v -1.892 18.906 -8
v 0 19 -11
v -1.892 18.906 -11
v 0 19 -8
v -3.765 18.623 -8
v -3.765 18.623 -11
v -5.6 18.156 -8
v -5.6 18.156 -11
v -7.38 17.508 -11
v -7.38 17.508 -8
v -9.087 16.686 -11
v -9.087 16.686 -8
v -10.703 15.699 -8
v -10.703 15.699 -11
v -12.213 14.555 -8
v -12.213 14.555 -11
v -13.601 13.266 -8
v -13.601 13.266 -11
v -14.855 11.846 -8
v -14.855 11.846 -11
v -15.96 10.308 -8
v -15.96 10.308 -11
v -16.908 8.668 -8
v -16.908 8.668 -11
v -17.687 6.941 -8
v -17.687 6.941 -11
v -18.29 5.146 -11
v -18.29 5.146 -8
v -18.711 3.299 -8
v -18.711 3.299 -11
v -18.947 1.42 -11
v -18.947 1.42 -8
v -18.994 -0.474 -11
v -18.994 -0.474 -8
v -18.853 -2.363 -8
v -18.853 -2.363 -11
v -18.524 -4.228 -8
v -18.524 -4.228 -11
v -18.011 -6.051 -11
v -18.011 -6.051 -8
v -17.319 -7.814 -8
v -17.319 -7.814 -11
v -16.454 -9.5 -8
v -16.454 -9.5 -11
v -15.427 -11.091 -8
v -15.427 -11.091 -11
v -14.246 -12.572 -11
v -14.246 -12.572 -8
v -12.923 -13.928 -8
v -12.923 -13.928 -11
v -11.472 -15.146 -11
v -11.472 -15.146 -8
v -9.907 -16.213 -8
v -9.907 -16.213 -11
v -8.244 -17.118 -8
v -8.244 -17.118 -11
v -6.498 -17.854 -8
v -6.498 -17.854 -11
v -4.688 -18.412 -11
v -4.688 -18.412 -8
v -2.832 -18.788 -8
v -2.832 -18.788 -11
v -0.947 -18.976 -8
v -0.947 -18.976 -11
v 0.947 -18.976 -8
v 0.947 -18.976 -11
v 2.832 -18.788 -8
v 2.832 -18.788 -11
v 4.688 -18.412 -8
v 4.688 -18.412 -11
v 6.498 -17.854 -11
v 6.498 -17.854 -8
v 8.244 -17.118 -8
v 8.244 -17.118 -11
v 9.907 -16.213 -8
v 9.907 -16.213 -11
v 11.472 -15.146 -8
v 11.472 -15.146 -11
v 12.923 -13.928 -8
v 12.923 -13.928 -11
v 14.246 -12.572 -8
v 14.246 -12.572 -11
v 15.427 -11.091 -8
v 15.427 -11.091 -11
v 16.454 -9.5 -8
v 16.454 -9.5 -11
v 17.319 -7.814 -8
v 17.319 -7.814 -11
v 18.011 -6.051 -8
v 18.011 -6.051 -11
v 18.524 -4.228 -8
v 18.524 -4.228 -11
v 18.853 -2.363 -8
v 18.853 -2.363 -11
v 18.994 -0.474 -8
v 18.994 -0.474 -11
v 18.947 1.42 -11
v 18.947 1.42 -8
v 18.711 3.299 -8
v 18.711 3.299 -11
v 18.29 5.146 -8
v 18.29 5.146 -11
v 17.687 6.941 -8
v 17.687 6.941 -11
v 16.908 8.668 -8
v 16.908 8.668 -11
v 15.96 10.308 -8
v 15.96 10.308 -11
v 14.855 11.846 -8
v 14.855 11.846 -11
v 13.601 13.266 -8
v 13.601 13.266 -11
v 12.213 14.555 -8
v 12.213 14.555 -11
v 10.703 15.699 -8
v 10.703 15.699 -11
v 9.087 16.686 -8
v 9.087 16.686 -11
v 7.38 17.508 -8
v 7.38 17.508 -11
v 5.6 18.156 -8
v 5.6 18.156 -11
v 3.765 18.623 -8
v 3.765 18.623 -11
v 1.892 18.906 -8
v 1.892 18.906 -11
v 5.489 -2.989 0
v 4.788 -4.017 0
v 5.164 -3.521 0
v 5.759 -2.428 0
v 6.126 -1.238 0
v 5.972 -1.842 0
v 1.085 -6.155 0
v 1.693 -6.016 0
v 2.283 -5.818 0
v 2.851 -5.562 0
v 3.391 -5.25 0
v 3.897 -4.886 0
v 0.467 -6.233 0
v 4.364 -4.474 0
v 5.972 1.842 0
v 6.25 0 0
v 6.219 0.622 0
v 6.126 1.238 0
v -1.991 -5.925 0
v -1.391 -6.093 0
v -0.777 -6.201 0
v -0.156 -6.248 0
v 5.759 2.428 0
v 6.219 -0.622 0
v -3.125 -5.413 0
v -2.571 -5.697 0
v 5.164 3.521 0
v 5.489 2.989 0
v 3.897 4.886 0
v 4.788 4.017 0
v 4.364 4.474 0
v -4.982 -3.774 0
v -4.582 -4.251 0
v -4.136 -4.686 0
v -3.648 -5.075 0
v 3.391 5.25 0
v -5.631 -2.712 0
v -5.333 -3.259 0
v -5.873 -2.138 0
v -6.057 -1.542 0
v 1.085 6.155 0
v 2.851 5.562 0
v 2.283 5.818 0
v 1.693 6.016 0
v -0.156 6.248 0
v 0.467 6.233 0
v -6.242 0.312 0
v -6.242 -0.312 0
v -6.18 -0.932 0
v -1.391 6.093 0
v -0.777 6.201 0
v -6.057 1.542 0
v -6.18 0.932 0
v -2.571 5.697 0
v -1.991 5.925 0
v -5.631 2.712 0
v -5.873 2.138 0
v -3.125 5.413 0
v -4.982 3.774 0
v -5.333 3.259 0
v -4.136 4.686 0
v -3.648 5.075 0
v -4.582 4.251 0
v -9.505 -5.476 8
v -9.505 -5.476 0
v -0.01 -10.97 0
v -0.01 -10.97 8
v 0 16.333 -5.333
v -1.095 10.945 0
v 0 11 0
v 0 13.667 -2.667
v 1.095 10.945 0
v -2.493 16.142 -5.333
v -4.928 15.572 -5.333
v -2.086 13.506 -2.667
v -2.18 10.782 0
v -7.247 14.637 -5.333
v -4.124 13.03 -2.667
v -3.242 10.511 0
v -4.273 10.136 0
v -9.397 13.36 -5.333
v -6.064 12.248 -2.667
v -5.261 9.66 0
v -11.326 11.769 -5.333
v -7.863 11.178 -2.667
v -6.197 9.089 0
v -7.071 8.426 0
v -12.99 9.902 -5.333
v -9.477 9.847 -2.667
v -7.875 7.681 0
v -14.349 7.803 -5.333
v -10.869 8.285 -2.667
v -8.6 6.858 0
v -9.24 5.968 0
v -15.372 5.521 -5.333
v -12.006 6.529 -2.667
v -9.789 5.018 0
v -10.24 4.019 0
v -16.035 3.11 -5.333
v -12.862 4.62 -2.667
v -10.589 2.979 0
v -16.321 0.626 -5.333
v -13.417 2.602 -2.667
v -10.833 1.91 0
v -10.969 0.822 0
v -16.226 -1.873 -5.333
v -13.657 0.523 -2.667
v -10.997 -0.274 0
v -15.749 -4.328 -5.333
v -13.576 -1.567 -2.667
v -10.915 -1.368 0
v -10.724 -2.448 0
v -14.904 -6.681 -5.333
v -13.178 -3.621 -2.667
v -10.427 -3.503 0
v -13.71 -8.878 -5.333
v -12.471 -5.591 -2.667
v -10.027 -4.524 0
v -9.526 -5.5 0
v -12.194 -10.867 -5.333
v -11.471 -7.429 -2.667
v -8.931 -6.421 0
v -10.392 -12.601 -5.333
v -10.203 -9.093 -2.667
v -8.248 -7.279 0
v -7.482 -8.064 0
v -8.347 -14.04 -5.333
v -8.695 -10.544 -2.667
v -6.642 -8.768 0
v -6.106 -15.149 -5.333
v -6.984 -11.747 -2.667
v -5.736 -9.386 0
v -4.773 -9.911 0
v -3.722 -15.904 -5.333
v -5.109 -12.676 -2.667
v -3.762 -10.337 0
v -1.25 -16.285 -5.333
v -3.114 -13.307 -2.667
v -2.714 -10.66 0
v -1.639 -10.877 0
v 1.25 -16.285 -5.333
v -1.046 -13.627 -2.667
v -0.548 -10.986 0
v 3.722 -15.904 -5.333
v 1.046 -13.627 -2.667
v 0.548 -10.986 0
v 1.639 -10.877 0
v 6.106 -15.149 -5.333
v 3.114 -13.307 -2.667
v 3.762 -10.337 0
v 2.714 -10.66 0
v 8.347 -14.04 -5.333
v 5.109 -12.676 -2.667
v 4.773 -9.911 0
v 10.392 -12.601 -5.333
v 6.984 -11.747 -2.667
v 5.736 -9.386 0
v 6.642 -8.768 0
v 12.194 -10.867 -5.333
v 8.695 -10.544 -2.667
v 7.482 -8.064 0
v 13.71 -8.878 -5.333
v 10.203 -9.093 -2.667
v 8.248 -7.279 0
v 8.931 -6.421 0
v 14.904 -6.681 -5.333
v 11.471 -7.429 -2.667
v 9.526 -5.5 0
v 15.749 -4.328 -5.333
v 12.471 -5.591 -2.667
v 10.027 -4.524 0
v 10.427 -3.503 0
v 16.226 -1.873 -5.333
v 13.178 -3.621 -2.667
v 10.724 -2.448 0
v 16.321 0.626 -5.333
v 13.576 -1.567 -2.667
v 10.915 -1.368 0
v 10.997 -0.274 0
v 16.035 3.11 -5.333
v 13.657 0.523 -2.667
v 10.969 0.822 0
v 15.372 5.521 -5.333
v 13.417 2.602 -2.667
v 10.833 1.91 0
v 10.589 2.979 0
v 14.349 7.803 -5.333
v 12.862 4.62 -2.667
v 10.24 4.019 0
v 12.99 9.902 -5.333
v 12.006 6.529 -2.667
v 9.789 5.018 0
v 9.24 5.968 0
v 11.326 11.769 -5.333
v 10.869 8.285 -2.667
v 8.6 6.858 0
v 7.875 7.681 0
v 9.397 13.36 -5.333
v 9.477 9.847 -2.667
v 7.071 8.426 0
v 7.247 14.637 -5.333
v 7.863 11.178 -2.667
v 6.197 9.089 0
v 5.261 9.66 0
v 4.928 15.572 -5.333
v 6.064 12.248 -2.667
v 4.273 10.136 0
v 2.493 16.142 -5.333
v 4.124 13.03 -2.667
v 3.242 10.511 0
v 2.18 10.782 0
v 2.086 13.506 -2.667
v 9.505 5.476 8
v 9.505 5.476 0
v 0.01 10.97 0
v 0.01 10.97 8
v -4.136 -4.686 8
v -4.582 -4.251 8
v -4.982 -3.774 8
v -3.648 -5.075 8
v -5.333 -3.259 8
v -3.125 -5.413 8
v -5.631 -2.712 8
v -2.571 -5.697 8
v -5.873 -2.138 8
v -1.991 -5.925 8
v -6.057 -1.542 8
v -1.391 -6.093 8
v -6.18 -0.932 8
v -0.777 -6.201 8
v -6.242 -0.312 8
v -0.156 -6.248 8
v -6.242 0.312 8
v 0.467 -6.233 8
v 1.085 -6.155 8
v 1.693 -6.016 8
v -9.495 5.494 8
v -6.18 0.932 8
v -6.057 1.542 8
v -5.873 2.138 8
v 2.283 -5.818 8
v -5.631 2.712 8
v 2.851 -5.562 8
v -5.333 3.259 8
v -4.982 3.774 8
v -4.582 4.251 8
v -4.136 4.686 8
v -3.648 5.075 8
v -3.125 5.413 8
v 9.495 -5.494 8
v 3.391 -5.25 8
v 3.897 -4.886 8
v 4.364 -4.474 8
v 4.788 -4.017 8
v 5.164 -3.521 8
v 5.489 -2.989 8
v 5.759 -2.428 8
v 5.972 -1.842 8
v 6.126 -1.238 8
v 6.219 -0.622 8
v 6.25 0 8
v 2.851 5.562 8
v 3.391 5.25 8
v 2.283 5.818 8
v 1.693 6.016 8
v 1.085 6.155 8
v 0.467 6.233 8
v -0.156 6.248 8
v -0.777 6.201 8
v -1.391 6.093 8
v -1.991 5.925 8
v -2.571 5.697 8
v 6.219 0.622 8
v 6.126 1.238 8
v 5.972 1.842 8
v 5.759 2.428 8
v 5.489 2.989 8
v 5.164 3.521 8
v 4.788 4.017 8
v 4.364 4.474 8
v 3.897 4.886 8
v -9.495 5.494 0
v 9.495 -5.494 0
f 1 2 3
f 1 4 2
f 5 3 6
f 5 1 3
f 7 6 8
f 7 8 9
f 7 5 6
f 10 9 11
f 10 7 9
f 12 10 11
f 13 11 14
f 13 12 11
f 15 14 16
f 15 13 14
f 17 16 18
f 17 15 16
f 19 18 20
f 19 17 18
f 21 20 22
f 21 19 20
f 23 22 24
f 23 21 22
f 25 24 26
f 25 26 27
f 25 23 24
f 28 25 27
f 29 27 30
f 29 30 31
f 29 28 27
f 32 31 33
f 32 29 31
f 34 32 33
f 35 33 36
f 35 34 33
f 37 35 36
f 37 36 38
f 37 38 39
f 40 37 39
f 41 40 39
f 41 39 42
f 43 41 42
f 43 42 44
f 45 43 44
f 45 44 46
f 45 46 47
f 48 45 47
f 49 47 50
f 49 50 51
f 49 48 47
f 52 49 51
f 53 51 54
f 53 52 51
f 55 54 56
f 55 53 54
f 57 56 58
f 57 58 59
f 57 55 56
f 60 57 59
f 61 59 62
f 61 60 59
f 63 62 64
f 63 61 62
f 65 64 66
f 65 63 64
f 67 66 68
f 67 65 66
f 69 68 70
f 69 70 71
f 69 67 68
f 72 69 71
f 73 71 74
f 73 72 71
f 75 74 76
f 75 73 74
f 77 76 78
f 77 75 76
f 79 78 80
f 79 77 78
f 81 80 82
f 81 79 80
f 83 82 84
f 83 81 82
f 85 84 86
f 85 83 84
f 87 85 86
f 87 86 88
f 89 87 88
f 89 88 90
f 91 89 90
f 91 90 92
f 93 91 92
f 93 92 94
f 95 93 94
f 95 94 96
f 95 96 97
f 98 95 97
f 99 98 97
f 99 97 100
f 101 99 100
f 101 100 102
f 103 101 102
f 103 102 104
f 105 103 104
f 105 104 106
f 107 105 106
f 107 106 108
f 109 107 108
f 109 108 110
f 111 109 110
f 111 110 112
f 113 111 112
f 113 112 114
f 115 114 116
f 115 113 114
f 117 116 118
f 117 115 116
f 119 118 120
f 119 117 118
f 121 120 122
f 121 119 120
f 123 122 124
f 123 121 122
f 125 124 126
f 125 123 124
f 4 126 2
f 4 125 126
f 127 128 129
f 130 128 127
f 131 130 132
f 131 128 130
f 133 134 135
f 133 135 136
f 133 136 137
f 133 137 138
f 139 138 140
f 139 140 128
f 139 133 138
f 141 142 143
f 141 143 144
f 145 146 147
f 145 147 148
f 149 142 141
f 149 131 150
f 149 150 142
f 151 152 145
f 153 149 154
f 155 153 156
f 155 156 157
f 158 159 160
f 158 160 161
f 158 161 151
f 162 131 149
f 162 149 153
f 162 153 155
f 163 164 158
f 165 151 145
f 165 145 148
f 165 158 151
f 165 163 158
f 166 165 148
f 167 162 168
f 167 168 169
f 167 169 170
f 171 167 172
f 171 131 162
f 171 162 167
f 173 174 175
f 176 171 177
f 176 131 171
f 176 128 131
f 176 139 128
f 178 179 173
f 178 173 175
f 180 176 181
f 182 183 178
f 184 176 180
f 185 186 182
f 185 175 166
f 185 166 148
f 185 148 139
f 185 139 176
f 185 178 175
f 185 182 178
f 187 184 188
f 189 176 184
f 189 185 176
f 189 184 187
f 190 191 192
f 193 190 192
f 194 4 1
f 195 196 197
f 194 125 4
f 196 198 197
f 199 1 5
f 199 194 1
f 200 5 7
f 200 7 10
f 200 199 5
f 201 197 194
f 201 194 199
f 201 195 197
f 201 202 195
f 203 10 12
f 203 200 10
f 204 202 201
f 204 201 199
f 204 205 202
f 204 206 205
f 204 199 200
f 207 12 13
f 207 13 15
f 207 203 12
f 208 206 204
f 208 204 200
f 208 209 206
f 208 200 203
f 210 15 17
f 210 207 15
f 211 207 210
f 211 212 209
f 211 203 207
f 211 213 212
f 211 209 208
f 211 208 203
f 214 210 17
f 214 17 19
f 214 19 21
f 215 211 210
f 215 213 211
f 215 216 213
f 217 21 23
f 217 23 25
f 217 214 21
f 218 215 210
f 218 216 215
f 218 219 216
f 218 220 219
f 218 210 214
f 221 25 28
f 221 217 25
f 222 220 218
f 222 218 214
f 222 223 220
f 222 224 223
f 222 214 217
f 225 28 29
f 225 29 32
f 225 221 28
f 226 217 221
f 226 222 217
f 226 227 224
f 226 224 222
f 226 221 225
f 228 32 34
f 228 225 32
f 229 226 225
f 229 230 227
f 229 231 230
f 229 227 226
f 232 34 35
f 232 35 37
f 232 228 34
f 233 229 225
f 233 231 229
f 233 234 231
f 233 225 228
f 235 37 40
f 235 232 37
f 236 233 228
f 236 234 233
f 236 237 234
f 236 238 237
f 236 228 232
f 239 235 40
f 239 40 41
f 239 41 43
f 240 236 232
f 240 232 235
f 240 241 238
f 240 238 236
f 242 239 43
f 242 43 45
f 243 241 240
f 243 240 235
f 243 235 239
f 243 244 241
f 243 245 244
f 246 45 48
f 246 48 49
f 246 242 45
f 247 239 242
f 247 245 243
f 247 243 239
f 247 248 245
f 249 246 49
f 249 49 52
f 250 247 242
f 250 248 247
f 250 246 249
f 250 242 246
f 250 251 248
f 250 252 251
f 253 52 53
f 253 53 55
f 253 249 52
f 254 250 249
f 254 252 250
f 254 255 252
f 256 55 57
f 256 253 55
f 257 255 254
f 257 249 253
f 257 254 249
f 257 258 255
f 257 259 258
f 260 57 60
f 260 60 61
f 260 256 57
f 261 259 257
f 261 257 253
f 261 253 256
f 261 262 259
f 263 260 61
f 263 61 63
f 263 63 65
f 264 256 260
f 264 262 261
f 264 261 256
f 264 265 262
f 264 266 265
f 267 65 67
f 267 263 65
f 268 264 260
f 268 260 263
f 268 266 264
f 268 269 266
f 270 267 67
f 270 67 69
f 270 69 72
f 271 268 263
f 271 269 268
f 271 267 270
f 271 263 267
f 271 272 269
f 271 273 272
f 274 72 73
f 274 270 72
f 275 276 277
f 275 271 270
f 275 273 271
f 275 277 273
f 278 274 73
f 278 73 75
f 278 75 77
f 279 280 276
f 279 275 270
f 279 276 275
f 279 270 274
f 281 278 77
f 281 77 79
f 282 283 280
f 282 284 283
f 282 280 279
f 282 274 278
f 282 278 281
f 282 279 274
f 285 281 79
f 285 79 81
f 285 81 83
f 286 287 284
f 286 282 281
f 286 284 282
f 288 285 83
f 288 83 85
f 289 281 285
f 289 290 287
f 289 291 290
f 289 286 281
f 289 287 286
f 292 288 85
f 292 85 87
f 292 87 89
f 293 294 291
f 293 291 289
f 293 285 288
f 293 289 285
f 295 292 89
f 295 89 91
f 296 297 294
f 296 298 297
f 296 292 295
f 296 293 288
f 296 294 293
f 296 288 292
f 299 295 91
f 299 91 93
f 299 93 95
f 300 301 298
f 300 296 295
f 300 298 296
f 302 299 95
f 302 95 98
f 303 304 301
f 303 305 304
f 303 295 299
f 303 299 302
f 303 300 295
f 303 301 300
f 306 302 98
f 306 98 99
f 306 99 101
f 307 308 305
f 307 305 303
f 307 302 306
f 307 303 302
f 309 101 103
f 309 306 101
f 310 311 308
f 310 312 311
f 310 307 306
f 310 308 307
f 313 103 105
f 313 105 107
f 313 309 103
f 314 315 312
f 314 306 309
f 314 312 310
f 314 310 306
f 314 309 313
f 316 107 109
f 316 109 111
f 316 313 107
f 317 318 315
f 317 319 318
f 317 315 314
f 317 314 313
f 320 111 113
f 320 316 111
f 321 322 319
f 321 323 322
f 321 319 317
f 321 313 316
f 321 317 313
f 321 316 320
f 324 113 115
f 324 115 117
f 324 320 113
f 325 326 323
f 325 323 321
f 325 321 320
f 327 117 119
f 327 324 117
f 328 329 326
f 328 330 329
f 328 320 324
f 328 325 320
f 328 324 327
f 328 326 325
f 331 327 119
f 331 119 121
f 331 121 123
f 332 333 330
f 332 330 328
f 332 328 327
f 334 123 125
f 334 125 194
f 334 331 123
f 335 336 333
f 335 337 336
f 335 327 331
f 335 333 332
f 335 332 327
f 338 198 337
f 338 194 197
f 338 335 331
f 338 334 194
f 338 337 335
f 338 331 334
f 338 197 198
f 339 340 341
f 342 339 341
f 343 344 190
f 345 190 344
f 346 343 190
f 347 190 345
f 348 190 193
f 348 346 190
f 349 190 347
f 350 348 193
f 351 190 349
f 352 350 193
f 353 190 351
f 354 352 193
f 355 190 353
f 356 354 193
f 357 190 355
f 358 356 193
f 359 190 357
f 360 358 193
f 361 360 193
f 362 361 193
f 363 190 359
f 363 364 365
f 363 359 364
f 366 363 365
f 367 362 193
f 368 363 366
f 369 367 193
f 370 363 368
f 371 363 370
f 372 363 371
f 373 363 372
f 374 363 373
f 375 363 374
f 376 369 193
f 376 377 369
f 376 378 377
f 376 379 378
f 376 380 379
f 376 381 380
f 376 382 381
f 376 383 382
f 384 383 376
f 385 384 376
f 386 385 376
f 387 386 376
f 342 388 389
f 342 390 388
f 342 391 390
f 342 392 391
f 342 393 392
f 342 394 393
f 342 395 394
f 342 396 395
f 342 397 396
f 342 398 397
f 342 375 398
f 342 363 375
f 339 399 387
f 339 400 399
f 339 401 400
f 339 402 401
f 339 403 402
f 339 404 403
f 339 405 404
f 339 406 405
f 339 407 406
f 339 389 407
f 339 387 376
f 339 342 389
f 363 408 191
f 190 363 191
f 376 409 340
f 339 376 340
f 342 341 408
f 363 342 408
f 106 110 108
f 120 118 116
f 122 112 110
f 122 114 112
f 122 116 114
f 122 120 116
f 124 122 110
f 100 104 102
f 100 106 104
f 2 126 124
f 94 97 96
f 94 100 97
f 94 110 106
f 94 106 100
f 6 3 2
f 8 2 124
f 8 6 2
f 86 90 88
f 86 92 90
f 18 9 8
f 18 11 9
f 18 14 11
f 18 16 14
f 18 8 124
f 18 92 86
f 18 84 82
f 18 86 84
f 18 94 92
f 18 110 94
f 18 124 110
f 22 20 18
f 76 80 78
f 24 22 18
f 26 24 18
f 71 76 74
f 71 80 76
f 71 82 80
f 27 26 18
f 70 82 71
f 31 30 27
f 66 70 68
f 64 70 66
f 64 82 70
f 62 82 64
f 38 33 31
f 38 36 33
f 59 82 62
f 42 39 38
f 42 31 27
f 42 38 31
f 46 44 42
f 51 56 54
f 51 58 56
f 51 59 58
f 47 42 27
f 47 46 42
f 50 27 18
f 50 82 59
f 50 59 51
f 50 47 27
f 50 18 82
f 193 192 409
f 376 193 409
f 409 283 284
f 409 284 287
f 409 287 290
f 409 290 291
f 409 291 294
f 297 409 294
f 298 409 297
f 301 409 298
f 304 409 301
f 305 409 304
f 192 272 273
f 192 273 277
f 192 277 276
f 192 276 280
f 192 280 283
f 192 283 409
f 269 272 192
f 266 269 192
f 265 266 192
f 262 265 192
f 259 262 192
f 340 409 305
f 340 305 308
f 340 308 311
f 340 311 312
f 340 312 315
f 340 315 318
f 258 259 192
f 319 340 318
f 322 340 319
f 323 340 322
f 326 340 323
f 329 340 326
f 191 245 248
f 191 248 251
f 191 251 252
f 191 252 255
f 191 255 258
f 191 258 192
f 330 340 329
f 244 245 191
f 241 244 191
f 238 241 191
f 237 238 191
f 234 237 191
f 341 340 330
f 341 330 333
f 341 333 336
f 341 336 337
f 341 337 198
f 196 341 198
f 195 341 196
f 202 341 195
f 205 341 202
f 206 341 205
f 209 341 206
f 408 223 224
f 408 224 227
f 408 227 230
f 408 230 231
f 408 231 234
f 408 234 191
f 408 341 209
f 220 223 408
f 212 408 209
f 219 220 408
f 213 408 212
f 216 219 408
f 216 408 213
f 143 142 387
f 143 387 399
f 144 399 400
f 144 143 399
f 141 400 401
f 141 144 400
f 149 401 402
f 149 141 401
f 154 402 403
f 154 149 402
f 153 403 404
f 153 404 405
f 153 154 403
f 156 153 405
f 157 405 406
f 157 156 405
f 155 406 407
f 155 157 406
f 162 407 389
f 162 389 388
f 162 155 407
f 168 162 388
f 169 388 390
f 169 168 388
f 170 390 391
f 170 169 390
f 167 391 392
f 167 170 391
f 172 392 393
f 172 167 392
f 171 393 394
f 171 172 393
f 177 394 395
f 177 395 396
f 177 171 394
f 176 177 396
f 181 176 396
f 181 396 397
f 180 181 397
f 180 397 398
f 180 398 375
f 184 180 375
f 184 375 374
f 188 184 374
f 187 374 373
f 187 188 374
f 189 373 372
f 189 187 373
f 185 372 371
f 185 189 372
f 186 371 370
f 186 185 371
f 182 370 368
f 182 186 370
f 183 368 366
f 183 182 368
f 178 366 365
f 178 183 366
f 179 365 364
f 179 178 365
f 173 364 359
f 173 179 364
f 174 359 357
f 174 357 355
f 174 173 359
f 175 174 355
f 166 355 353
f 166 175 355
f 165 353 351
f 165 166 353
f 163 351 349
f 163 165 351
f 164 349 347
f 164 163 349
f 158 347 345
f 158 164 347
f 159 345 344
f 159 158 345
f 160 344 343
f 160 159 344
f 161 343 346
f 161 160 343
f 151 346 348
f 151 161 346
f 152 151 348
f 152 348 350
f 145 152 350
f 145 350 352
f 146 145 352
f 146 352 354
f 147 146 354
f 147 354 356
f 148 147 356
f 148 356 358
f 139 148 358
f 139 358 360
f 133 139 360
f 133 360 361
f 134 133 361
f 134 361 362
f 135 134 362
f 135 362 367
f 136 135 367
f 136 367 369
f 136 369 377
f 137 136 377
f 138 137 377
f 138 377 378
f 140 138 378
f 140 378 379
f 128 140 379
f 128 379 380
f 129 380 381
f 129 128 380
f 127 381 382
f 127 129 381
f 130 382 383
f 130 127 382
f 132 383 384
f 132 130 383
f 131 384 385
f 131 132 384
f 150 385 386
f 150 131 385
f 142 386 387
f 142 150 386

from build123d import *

# Parameters (mm, degrees)
F0_R     = 6.25
F1_DEPTH = 8


with BuildPart() as f1:
    # F0 (on Top) → F1 (new body)
    with BuildSketch(Plane.XY):
        Polygon((9.494796, -5.493831), (9.505195, 5.475819), (0.010399, 10.96965), (-9.494796, 5.493831), (-9.505195, -5.475819), (-0.010399, -10.96965), align=None)
        Circle(F0_R, mode=Mode.SUBTRACT)
    extrude(amount=F1_DEPTH)

    # F2 (on Right) → F3 (revolve)
    with BuildSketch(Plane.YZ):
        Polygon((11, 0), (0, 0), (0, -11), (19, -11), (19, -8), align=None)
    revolve(axis=Axis((0, 0, -5.5), (0, 0, 1)))


solid = f1.part
